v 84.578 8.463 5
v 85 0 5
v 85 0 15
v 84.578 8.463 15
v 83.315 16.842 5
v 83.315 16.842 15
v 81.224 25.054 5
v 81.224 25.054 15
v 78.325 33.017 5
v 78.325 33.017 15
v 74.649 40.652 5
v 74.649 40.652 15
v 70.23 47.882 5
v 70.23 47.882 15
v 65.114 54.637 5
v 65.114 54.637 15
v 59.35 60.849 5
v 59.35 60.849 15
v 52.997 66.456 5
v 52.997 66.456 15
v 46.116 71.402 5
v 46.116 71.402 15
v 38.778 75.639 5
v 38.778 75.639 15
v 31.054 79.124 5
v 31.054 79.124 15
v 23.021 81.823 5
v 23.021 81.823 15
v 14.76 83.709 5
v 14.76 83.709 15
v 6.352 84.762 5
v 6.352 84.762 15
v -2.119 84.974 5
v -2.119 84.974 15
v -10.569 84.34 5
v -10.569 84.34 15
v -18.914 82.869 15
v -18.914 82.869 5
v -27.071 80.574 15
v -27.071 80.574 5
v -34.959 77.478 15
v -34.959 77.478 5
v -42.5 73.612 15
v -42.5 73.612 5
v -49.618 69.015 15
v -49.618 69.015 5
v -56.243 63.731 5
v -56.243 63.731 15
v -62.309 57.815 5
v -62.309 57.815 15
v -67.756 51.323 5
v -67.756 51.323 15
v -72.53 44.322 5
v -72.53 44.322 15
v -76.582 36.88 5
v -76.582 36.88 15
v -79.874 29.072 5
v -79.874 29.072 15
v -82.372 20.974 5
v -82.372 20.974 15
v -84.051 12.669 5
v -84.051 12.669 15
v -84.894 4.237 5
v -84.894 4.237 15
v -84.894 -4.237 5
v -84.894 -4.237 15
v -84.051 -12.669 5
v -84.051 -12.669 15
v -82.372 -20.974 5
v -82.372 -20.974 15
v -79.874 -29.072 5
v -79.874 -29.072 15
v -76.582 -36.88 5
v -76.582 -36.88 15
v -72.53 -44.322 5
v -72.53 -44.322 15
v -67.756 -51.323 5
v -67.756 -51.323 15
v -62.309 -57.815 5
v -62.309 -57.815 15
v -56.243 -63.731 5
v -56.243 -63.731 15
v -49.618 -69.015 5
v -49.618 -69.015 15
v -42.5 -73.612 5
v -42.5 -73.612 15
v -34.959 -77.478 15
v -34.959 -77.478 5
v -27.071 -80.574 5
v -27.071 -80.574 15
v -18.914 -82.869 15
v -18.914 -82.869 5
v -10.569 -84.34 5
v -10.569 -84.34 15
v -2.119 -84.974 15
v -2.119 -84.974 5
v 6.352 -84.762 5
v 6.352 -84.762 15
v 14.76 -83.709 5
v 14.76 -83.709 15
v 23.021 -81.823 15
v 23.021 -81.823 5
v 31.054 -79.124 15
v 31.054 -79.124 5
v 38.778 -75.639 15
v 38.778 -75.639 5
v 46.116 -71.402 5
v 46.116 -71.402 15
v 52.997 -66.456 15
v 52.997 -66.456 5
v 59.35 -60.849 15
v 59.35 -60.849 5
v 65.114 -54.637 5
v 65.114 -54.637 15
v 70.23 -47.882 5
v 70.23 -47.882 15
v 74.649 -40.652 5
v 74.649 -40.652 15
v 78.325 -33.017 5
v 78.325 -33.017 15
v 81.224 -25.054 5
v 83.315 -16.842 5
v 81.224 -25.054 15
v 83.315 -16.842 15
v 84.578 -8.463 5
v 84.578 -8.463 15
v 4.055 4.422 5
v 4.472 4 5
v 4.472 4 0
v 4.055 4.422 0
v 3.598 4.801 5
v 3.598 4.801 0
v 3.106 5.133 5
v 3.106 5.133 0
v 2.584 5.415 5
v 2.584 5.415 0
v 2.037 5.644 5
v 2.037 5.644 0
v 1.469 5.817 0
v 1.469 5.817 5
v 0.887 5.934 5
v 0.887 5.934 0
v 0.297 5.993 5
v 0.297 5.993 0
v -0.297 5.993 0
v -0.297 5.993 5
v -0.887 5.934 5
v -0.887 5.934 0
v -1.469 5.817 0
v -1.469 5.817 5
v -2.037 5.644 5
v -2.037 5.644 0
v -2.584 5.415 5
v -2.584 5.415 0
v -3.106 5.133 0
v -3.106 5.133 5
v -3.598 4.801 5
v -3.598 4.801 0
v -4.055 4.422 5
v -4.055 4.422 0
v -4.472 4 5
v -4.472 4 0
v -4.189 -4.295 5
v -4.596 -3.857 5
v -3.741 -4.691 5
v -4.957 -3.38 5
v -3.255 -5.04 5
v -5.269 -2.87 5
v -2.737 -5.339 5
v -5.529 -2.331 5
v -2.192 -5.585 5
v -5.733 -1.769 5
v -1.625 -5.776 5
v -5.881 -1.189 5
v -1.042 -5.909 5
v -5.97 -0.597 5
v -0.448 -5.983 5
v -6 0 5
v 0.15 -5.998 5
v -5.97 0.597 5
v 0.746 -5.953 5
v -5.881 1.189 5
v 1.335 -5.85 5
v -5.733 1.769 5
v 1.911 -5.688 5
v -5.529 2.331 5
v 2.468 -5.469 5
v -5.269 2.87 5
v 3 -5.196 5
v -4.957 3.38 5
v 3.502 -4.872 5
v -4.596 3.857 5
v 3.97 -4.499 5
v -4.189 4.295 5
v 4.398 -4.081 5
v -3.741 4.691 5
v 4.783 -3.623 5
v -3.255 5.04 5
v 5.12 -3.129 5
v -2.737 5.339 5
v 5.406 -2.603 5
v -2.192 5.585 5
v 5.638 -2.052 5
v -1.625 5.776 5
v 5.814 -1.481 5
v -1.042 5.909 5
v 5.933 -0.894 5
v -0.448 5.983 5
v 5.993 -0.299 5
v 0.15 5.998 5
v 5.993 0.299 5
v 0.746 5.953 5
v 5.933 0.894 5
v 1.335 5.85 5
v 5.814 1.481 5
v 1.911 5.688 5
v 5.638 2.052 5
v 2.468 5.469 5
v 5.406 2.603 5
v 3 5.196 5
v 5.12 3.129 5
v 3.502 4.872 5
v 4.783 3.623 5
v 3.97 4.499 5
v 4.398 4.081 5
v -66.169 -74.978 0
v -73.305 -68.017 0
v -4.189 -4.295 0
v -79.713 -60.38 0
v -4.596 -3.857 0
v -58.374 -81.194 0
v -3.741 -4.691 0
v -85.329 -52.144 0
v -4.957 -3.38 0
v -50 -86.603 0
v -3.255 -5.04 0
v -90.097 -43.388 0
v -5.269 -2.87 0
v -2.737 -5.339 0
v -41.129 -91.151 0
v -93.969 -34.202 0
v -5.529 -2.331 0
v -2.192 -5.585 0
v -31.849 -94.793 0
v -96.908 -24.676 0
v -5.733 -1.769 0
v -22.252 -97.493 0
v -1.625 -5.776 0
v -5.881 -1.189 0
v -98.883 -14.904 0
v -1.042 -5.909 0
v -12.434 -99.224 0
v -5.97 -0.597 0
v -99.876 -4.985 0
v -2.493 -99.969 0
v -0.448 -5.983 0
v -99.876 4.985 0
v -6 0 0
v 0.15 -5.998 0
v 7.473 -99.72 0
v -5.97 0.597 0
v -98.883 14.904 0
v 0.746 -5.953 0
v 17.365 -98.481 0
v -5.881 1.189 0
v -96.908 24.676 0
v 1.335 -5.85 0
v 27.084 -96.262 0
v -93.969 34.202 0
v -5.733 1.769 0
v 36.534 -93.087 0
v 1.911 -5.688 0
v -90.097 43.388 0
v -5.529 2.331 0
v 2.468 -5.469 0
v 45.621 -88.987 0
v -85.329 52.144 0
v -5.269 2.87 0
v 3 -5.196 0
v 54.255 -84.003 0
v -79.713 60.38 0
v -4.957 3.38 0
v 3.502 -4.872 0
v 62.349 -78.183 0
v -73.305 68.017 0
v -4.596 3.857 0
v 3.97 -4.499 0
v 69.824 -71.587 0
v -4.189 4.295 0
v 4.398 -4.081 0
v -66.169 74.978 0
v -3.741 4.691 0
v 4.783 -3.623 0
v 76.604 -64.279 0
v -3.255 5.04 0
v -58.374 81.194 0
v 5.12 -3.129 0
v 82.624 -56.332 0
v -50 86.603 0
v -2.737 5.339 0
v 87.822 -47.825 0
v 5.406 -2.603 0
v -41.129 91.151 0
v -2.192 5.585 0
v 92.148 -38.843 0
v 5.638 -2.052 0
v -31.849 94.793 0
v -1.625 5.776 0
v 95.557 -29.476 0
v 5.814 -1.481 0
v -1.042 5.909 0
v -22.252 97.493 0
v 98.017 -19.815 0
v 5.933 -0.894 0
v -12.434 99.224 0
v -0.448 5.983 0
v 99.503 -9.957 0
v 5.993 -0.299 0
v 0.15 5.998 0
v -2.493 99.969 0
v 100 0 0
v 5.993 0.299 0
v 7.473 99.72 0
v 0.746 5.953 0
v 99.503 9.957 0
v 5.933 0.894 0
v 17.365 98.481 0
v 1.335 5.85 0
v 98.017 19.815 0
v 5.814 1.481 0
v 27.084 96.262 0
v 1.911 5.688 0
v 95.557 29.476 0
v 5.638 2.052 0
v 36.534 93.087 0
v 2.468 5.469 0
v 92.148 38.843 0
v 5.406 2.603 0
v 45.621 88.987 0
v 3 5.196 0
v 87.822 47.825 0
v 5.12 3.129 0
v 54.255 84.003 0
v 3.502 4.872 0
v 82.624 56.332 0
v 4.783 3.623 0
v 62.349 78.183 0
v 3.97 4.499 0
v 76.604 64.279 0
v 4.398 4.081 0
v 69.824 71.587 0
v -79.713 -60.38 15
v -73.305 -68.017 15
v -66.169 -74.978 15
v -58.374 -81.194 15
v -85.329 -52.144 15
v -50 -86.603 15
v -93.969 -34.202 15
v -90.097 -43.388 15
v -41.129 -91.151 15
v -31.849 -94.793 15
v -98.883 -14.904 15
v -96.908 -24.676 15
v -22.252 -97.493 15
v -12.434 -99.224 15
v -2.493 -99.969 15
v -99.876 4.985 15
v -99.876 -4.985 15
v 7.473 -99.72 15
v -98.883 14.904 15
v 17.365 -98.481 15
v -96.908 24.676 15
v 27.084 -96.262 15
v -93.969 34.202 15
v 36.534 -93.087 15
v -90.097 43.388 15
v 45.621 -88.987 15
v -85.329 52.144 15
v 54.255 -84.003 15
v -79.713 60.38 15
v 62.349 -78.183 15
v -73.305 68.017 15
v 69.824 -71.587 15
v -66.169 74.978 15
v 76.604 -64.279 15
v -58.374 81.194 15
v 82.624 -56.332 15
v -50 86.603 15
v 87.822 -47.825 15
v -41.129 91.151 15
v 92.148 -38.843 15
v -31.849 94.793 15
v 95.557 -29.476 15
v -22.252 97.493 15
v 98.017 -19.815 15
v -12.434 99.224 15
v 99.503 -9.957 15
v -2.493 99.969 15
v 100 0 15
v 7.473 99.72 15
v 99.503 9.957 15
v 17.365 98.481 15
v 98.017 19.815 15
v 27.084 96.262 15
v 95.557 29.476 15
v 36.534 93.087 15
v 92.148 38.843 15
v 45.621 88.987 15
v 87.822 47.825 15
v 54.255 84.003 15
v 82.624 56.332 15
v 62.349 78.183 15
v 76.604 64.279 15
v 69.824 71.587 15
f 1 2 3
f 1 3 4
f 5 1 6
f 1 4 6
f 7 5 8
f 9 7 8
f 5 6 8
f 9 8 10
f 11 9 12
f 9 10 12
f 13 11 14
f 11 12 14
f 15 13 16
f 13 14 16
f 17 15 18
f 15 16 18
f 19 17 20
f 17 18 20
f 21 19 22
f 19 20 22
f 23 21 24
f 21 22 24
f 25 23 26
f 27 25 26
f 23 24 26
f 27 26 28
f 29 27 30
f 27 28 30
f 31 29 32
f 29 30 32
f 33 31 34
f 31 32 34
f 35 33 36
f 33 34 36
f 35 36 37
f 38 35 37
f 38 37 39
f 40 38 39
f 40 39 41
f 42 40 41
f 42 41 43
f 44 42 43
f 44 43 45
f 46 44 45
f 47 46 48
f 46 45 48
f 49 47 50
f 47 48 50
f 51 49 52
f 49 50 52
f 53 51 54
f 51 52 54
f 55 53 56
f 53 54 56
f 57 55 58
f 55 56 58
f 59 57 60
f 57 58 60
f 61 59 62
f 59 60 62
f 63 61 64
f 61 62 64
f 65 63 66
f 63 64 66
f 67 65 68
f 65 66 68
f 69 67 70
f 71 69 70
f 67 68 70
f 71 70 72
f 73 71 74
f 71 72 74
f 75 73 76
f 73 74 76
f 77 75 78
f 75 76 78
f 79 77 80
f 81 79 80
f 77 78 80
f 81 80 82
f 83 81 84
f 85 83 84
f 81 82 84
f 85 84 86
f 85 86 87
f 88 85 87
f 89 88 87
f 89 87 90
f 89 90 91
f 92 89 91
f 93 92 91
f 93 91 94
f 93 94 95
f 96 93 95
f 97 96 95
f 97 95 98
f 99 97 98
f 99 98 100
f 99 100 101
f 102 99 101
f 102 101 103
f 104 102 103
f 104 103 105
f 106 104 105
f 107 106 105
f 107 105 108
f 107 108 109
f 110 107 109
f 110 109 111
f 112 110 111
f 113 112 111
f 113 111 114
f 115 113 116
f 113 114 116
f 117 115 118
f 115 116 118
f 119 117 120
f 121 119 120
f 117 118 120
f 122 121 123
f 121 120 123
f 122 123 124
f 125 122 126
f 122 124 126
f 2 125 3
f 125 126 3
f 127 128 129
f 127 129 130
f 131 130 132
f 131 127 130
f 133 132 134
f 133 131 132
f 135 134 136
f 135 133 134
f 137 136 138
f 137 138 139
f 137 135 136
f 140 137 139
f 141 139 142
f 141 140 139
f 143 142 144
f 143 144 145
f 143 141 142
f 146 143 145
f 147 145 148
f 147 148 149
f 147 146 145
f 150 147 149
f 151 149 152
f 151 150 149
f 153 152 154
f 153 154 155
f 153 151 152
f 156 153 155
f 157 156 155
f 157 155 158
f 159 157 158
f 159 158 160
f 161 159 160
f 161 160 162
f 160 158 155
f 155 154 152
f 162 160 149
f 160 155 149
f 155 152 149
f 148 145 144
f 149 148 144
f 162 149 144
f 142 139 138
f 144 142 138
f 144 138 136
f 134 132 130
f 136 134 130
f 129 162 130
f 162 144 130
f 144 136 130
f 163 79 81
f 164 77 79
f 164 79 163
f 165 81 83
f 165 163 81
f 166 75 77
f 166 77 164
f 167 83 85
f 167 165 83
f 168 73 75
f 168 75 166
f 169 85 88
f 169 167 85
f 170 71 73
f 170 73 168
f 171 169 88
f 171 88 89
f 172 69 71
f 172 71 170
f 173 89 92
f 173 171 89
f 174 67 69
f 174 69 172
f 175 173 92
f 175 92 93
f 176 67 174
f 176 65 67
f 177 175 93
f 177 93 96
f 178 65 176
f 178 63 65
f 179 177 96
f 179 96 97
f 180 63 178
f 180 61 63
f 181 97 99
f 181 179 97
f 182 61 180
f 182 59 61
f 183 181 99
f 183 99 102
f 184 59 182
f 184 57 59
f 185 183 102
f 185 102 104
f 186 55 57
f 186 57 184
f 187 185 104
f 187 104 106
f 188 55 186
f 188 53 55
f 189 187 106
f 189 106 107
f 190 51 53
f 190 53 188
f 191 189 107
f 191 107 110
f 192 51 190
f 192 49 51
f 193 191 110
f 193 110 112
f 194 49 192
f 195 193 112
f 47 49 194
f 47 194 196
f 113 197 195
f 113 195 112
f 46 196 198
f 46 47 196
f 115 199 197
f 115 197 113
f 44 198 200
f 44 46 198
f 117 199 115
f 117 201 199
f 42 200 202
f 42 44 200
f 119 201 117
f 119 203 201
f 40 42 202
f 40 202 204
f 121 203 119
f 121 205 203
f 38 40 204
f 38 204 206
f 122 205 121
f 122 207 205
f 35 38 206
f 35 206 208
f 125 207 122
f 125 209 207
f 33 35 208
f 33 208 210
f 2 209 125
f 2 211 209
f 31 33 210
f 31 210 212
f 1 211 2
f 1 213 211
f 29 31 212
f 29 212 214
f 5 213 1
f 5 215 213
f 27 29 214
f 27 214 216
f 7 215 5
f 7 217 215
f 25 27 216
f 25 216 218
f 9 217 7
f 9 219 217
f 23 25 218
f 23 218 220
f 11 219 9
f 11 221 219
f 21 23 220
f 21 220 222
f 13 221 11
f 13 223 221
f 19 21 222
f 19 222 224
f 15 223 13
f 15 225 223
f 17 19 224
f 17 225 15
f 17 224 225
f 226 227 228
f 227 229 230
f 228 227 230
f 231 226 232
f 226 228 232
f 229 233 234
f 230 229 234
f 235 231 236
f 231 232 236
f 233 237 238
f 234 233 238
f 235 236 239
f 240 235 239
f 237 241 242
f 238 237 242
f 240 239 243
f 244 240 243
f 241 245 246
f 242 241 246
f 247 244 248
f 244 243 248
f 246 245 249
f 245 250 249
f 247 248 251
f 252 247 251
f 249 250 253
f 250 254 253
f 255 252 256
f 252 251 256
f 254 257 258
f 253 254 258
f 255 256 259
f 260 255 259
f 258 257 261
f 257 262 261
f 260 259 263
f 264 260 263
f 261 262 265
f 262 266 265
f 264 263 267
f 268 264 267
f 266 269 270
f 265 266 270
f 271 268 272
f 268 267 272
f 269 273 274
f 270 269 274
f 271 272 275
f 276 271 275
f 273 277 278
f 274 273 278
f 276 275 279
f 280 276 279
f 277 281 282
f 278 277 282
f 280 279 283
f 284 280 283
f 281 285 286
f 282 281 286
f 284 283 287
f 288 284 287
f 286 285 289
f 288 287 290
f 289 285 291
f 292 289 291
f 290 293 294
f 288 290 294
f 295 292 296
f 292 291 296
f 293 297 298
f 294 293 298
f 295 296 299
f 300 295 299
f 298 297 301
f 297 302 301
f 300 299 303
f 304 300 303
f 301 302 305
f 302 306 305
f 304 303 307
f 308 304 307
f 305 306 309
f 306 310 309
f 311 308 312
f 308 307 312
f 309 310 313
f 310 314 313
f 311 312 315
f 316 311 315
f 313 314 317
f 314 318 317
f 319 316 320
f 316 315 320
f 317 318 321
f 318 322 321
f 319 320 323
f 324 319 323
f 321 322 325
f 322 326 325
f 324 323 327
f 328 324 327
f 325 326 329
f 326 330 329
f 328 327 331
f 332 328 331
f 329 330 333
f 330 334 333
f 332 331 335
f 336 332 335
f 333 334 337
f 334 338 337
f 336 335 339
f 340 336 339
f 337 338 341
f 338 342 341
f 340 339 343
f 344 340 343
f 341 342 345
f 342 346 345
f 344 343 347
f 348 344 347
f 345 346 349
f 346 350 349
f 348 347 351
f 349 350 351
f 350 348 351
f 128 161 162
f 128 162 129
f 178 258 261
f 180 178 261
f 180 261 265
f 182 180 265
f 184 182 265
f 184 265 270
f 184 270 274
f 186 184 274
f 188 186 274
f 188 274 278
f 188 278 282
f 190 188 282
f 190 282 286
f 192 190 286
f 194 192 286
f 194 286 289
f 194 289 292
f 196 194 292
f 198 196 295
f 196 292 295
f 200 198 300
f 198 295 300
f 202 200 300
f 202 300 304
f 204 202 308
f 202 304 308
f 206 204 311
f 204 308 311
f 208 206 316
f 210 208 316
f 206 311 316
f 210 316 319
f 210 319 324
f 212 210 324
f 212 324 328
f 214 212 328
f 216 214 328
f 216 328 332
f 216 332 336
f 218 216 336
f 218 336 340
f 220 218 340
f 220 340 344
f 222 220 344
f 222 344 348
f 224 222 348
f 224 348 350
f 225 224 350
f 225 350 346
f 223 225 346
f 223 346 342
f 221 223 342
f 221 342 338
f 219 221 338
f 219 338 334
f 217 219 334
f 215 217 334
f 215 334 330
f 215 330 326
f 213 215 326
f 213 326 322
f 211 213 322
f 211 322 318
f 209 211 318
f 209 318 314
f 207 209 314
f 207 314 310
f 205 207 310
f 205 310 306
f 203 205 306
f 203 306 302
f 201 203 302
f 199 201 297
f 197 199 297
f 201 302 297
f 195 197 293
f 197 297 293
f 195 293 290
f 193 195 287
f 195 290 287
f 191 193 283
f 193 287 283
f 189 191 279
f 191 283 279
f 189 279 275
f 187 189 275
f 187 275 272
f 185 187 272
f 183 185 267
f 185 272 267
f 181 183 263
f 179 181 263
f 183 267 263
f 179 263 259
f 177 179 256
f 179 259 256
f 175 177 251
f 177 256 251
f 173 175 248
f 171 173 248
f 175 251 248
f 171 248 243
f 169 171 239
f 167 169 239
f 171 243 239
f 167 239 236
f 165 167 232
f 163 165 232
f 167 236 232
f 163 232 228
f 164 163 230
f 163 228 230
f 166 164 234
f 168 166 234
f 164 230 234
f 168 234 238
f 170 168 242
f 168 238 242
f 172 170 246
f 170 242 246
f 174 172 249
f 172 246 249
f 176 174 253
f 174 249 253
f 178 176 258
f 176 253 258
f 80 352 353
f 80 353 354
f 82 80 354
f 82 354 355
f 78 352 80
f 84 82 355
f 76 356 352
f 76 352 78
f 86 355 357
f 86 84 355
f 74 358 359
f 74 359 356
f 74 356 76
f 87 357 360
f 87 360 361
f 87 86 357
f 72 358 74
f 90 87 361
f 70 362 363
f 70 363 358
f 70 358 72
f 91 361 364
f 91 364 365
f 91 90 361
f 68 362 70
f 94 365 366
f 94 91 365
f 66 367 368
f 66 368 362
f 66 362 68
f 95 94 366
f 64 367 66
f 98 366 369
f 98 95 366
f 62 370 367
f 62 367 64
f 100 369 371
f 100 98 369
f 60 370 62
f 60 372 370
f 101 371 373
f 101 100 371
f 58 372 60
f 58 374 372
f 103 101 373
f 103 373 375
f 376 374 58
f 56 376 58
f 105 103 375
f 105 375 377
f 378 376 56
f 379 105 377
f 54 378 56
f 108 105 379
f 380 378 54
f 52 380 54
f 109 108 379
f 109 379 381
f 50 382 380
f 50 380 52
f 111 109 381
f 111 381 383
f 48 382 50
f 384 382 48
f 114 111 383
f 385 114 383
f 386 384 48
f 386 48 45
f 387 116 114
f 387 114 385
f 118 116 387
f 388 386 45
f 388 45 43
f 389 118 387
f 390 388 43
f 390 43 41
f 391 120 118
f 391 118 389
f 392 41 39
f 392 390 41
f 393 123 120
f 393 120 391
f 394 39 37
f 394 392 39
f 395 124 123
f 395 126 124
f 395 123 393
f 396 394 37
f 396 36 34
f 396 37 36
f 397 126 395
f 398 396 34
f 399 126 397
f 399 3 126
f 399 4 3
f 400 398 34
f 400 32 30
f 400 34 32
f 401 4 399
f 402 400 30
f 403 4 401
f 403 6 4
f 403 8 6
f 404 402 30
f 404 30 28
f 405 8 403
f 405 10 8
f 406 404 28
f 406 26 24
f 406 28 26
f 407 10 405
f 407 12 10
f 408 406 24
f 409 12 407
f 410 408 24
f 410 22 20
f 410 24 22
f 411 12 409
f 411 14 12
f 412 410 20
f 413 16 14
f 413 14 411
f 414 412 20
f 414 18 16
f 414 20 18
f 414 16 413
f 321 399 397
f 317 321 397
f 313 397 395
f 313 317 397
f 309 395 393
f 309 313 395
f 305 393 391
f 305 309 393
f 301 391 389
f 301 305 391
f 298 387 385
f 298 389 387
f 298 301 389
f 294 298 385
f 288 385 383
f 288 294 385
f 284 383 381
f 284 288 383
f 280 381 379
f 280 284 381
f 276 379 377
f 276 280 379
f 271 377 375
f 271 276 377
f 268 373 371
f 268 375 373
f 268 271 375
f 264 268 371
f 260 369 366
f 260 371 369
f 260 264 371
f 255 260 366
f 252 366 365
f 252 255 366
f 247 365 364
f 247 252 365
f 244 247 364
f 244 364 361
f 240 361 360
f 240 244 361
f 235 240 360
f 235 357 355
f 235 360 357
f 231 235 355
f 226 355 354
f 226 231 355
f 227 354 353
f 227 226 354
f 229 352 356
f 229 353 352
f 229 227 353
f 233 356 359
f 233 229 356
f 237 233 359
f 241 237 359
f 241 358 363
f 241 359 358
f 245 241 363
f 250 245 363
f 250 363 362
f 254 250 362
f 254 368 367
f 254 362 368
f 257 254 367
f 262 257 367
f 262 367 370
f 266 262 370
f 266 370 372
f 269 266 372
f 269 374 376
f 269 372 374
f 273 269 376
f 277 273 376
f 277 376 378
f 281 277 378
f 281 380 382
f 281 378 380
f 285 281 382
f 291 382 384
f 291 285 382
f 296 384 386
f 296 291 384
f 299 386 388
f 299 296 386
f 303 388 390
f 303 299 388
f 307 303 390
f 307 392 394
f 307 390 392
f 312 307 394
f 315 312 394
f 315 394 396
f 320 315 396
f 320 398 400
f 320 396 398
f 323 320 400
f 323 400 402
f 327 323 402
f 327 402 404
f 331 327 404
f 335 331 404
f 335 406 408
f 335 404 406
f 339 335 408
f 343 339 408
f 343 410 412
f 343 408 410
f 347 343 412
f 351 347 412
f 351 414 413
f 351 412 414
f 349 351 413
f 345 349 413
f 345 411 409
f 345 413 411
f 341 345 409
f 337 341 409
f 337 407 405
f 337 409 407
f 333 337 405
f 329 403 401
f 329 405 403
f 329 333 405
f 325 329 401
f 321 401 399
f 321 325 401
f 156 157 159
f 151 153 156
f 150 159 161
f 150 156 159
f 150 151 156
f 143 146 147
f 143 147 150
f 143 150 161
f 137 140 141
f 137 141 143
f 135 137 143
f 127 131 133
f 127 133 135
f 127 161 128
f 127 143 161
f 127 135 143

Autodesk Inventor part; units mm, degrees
ref_plane "YZ Plane" through (0, 0, 0) normal (1, 0, 0) x (0, 1, 0)
ref_plane "XZ Plane" through (0, 0, 0) normal (0, 1, 0) x (-1, 0, 0)
ref_plane "XY Plane" through (0, 0, 0) normal (0, 0, 1) x (1, 0, 0)
sketch "スケッチ1" plane through (0, 0, 0) normal (0, 0, 1) x (1, 0, 0)
  circle A0 centre (0, 0) radius 100
  dimension "d0" = 200
extrude "押し出し1" add sketch "スケッチ1" along normal blind 15
sketch "スケッチ2" plane through (0, 0, 15) normal (0, 0, 1) x (1, 0, 0)
  circle A0 centre (0, 0) radius 85
  dimension "d3" = 170
extrude "押し出し2" cut sketch "スケッチ2" against normal blind 10
sketch "スケッチ3" plane through (0, 0, 0) normal (0, 0, -1) x (-1, 0, 0)
  circle A0 centre (0, 0) radius 6
  dimension "d6" = 12
extrude "押し出し3" cut sketch "スケッチ3" against normal through all
sketch "スケッチ4" plane through (0, 0, 5) normal (0, 0, 1) x (1, 0, 0)
  arc A0 (4.4721, 4) -> (-4.4721, 4) centre (0, 0) ccw
  line L0 (0, 4) -> (4.4721, 4)
  line L1 (0, 4) -> (-4.4721, 4)
  dimension "d9" = 12
  dimension "d10" = 4
extrude "押し出し4" add sketch "スケッチ4" against normal blind 5
properties part number "計測輪20mm"
